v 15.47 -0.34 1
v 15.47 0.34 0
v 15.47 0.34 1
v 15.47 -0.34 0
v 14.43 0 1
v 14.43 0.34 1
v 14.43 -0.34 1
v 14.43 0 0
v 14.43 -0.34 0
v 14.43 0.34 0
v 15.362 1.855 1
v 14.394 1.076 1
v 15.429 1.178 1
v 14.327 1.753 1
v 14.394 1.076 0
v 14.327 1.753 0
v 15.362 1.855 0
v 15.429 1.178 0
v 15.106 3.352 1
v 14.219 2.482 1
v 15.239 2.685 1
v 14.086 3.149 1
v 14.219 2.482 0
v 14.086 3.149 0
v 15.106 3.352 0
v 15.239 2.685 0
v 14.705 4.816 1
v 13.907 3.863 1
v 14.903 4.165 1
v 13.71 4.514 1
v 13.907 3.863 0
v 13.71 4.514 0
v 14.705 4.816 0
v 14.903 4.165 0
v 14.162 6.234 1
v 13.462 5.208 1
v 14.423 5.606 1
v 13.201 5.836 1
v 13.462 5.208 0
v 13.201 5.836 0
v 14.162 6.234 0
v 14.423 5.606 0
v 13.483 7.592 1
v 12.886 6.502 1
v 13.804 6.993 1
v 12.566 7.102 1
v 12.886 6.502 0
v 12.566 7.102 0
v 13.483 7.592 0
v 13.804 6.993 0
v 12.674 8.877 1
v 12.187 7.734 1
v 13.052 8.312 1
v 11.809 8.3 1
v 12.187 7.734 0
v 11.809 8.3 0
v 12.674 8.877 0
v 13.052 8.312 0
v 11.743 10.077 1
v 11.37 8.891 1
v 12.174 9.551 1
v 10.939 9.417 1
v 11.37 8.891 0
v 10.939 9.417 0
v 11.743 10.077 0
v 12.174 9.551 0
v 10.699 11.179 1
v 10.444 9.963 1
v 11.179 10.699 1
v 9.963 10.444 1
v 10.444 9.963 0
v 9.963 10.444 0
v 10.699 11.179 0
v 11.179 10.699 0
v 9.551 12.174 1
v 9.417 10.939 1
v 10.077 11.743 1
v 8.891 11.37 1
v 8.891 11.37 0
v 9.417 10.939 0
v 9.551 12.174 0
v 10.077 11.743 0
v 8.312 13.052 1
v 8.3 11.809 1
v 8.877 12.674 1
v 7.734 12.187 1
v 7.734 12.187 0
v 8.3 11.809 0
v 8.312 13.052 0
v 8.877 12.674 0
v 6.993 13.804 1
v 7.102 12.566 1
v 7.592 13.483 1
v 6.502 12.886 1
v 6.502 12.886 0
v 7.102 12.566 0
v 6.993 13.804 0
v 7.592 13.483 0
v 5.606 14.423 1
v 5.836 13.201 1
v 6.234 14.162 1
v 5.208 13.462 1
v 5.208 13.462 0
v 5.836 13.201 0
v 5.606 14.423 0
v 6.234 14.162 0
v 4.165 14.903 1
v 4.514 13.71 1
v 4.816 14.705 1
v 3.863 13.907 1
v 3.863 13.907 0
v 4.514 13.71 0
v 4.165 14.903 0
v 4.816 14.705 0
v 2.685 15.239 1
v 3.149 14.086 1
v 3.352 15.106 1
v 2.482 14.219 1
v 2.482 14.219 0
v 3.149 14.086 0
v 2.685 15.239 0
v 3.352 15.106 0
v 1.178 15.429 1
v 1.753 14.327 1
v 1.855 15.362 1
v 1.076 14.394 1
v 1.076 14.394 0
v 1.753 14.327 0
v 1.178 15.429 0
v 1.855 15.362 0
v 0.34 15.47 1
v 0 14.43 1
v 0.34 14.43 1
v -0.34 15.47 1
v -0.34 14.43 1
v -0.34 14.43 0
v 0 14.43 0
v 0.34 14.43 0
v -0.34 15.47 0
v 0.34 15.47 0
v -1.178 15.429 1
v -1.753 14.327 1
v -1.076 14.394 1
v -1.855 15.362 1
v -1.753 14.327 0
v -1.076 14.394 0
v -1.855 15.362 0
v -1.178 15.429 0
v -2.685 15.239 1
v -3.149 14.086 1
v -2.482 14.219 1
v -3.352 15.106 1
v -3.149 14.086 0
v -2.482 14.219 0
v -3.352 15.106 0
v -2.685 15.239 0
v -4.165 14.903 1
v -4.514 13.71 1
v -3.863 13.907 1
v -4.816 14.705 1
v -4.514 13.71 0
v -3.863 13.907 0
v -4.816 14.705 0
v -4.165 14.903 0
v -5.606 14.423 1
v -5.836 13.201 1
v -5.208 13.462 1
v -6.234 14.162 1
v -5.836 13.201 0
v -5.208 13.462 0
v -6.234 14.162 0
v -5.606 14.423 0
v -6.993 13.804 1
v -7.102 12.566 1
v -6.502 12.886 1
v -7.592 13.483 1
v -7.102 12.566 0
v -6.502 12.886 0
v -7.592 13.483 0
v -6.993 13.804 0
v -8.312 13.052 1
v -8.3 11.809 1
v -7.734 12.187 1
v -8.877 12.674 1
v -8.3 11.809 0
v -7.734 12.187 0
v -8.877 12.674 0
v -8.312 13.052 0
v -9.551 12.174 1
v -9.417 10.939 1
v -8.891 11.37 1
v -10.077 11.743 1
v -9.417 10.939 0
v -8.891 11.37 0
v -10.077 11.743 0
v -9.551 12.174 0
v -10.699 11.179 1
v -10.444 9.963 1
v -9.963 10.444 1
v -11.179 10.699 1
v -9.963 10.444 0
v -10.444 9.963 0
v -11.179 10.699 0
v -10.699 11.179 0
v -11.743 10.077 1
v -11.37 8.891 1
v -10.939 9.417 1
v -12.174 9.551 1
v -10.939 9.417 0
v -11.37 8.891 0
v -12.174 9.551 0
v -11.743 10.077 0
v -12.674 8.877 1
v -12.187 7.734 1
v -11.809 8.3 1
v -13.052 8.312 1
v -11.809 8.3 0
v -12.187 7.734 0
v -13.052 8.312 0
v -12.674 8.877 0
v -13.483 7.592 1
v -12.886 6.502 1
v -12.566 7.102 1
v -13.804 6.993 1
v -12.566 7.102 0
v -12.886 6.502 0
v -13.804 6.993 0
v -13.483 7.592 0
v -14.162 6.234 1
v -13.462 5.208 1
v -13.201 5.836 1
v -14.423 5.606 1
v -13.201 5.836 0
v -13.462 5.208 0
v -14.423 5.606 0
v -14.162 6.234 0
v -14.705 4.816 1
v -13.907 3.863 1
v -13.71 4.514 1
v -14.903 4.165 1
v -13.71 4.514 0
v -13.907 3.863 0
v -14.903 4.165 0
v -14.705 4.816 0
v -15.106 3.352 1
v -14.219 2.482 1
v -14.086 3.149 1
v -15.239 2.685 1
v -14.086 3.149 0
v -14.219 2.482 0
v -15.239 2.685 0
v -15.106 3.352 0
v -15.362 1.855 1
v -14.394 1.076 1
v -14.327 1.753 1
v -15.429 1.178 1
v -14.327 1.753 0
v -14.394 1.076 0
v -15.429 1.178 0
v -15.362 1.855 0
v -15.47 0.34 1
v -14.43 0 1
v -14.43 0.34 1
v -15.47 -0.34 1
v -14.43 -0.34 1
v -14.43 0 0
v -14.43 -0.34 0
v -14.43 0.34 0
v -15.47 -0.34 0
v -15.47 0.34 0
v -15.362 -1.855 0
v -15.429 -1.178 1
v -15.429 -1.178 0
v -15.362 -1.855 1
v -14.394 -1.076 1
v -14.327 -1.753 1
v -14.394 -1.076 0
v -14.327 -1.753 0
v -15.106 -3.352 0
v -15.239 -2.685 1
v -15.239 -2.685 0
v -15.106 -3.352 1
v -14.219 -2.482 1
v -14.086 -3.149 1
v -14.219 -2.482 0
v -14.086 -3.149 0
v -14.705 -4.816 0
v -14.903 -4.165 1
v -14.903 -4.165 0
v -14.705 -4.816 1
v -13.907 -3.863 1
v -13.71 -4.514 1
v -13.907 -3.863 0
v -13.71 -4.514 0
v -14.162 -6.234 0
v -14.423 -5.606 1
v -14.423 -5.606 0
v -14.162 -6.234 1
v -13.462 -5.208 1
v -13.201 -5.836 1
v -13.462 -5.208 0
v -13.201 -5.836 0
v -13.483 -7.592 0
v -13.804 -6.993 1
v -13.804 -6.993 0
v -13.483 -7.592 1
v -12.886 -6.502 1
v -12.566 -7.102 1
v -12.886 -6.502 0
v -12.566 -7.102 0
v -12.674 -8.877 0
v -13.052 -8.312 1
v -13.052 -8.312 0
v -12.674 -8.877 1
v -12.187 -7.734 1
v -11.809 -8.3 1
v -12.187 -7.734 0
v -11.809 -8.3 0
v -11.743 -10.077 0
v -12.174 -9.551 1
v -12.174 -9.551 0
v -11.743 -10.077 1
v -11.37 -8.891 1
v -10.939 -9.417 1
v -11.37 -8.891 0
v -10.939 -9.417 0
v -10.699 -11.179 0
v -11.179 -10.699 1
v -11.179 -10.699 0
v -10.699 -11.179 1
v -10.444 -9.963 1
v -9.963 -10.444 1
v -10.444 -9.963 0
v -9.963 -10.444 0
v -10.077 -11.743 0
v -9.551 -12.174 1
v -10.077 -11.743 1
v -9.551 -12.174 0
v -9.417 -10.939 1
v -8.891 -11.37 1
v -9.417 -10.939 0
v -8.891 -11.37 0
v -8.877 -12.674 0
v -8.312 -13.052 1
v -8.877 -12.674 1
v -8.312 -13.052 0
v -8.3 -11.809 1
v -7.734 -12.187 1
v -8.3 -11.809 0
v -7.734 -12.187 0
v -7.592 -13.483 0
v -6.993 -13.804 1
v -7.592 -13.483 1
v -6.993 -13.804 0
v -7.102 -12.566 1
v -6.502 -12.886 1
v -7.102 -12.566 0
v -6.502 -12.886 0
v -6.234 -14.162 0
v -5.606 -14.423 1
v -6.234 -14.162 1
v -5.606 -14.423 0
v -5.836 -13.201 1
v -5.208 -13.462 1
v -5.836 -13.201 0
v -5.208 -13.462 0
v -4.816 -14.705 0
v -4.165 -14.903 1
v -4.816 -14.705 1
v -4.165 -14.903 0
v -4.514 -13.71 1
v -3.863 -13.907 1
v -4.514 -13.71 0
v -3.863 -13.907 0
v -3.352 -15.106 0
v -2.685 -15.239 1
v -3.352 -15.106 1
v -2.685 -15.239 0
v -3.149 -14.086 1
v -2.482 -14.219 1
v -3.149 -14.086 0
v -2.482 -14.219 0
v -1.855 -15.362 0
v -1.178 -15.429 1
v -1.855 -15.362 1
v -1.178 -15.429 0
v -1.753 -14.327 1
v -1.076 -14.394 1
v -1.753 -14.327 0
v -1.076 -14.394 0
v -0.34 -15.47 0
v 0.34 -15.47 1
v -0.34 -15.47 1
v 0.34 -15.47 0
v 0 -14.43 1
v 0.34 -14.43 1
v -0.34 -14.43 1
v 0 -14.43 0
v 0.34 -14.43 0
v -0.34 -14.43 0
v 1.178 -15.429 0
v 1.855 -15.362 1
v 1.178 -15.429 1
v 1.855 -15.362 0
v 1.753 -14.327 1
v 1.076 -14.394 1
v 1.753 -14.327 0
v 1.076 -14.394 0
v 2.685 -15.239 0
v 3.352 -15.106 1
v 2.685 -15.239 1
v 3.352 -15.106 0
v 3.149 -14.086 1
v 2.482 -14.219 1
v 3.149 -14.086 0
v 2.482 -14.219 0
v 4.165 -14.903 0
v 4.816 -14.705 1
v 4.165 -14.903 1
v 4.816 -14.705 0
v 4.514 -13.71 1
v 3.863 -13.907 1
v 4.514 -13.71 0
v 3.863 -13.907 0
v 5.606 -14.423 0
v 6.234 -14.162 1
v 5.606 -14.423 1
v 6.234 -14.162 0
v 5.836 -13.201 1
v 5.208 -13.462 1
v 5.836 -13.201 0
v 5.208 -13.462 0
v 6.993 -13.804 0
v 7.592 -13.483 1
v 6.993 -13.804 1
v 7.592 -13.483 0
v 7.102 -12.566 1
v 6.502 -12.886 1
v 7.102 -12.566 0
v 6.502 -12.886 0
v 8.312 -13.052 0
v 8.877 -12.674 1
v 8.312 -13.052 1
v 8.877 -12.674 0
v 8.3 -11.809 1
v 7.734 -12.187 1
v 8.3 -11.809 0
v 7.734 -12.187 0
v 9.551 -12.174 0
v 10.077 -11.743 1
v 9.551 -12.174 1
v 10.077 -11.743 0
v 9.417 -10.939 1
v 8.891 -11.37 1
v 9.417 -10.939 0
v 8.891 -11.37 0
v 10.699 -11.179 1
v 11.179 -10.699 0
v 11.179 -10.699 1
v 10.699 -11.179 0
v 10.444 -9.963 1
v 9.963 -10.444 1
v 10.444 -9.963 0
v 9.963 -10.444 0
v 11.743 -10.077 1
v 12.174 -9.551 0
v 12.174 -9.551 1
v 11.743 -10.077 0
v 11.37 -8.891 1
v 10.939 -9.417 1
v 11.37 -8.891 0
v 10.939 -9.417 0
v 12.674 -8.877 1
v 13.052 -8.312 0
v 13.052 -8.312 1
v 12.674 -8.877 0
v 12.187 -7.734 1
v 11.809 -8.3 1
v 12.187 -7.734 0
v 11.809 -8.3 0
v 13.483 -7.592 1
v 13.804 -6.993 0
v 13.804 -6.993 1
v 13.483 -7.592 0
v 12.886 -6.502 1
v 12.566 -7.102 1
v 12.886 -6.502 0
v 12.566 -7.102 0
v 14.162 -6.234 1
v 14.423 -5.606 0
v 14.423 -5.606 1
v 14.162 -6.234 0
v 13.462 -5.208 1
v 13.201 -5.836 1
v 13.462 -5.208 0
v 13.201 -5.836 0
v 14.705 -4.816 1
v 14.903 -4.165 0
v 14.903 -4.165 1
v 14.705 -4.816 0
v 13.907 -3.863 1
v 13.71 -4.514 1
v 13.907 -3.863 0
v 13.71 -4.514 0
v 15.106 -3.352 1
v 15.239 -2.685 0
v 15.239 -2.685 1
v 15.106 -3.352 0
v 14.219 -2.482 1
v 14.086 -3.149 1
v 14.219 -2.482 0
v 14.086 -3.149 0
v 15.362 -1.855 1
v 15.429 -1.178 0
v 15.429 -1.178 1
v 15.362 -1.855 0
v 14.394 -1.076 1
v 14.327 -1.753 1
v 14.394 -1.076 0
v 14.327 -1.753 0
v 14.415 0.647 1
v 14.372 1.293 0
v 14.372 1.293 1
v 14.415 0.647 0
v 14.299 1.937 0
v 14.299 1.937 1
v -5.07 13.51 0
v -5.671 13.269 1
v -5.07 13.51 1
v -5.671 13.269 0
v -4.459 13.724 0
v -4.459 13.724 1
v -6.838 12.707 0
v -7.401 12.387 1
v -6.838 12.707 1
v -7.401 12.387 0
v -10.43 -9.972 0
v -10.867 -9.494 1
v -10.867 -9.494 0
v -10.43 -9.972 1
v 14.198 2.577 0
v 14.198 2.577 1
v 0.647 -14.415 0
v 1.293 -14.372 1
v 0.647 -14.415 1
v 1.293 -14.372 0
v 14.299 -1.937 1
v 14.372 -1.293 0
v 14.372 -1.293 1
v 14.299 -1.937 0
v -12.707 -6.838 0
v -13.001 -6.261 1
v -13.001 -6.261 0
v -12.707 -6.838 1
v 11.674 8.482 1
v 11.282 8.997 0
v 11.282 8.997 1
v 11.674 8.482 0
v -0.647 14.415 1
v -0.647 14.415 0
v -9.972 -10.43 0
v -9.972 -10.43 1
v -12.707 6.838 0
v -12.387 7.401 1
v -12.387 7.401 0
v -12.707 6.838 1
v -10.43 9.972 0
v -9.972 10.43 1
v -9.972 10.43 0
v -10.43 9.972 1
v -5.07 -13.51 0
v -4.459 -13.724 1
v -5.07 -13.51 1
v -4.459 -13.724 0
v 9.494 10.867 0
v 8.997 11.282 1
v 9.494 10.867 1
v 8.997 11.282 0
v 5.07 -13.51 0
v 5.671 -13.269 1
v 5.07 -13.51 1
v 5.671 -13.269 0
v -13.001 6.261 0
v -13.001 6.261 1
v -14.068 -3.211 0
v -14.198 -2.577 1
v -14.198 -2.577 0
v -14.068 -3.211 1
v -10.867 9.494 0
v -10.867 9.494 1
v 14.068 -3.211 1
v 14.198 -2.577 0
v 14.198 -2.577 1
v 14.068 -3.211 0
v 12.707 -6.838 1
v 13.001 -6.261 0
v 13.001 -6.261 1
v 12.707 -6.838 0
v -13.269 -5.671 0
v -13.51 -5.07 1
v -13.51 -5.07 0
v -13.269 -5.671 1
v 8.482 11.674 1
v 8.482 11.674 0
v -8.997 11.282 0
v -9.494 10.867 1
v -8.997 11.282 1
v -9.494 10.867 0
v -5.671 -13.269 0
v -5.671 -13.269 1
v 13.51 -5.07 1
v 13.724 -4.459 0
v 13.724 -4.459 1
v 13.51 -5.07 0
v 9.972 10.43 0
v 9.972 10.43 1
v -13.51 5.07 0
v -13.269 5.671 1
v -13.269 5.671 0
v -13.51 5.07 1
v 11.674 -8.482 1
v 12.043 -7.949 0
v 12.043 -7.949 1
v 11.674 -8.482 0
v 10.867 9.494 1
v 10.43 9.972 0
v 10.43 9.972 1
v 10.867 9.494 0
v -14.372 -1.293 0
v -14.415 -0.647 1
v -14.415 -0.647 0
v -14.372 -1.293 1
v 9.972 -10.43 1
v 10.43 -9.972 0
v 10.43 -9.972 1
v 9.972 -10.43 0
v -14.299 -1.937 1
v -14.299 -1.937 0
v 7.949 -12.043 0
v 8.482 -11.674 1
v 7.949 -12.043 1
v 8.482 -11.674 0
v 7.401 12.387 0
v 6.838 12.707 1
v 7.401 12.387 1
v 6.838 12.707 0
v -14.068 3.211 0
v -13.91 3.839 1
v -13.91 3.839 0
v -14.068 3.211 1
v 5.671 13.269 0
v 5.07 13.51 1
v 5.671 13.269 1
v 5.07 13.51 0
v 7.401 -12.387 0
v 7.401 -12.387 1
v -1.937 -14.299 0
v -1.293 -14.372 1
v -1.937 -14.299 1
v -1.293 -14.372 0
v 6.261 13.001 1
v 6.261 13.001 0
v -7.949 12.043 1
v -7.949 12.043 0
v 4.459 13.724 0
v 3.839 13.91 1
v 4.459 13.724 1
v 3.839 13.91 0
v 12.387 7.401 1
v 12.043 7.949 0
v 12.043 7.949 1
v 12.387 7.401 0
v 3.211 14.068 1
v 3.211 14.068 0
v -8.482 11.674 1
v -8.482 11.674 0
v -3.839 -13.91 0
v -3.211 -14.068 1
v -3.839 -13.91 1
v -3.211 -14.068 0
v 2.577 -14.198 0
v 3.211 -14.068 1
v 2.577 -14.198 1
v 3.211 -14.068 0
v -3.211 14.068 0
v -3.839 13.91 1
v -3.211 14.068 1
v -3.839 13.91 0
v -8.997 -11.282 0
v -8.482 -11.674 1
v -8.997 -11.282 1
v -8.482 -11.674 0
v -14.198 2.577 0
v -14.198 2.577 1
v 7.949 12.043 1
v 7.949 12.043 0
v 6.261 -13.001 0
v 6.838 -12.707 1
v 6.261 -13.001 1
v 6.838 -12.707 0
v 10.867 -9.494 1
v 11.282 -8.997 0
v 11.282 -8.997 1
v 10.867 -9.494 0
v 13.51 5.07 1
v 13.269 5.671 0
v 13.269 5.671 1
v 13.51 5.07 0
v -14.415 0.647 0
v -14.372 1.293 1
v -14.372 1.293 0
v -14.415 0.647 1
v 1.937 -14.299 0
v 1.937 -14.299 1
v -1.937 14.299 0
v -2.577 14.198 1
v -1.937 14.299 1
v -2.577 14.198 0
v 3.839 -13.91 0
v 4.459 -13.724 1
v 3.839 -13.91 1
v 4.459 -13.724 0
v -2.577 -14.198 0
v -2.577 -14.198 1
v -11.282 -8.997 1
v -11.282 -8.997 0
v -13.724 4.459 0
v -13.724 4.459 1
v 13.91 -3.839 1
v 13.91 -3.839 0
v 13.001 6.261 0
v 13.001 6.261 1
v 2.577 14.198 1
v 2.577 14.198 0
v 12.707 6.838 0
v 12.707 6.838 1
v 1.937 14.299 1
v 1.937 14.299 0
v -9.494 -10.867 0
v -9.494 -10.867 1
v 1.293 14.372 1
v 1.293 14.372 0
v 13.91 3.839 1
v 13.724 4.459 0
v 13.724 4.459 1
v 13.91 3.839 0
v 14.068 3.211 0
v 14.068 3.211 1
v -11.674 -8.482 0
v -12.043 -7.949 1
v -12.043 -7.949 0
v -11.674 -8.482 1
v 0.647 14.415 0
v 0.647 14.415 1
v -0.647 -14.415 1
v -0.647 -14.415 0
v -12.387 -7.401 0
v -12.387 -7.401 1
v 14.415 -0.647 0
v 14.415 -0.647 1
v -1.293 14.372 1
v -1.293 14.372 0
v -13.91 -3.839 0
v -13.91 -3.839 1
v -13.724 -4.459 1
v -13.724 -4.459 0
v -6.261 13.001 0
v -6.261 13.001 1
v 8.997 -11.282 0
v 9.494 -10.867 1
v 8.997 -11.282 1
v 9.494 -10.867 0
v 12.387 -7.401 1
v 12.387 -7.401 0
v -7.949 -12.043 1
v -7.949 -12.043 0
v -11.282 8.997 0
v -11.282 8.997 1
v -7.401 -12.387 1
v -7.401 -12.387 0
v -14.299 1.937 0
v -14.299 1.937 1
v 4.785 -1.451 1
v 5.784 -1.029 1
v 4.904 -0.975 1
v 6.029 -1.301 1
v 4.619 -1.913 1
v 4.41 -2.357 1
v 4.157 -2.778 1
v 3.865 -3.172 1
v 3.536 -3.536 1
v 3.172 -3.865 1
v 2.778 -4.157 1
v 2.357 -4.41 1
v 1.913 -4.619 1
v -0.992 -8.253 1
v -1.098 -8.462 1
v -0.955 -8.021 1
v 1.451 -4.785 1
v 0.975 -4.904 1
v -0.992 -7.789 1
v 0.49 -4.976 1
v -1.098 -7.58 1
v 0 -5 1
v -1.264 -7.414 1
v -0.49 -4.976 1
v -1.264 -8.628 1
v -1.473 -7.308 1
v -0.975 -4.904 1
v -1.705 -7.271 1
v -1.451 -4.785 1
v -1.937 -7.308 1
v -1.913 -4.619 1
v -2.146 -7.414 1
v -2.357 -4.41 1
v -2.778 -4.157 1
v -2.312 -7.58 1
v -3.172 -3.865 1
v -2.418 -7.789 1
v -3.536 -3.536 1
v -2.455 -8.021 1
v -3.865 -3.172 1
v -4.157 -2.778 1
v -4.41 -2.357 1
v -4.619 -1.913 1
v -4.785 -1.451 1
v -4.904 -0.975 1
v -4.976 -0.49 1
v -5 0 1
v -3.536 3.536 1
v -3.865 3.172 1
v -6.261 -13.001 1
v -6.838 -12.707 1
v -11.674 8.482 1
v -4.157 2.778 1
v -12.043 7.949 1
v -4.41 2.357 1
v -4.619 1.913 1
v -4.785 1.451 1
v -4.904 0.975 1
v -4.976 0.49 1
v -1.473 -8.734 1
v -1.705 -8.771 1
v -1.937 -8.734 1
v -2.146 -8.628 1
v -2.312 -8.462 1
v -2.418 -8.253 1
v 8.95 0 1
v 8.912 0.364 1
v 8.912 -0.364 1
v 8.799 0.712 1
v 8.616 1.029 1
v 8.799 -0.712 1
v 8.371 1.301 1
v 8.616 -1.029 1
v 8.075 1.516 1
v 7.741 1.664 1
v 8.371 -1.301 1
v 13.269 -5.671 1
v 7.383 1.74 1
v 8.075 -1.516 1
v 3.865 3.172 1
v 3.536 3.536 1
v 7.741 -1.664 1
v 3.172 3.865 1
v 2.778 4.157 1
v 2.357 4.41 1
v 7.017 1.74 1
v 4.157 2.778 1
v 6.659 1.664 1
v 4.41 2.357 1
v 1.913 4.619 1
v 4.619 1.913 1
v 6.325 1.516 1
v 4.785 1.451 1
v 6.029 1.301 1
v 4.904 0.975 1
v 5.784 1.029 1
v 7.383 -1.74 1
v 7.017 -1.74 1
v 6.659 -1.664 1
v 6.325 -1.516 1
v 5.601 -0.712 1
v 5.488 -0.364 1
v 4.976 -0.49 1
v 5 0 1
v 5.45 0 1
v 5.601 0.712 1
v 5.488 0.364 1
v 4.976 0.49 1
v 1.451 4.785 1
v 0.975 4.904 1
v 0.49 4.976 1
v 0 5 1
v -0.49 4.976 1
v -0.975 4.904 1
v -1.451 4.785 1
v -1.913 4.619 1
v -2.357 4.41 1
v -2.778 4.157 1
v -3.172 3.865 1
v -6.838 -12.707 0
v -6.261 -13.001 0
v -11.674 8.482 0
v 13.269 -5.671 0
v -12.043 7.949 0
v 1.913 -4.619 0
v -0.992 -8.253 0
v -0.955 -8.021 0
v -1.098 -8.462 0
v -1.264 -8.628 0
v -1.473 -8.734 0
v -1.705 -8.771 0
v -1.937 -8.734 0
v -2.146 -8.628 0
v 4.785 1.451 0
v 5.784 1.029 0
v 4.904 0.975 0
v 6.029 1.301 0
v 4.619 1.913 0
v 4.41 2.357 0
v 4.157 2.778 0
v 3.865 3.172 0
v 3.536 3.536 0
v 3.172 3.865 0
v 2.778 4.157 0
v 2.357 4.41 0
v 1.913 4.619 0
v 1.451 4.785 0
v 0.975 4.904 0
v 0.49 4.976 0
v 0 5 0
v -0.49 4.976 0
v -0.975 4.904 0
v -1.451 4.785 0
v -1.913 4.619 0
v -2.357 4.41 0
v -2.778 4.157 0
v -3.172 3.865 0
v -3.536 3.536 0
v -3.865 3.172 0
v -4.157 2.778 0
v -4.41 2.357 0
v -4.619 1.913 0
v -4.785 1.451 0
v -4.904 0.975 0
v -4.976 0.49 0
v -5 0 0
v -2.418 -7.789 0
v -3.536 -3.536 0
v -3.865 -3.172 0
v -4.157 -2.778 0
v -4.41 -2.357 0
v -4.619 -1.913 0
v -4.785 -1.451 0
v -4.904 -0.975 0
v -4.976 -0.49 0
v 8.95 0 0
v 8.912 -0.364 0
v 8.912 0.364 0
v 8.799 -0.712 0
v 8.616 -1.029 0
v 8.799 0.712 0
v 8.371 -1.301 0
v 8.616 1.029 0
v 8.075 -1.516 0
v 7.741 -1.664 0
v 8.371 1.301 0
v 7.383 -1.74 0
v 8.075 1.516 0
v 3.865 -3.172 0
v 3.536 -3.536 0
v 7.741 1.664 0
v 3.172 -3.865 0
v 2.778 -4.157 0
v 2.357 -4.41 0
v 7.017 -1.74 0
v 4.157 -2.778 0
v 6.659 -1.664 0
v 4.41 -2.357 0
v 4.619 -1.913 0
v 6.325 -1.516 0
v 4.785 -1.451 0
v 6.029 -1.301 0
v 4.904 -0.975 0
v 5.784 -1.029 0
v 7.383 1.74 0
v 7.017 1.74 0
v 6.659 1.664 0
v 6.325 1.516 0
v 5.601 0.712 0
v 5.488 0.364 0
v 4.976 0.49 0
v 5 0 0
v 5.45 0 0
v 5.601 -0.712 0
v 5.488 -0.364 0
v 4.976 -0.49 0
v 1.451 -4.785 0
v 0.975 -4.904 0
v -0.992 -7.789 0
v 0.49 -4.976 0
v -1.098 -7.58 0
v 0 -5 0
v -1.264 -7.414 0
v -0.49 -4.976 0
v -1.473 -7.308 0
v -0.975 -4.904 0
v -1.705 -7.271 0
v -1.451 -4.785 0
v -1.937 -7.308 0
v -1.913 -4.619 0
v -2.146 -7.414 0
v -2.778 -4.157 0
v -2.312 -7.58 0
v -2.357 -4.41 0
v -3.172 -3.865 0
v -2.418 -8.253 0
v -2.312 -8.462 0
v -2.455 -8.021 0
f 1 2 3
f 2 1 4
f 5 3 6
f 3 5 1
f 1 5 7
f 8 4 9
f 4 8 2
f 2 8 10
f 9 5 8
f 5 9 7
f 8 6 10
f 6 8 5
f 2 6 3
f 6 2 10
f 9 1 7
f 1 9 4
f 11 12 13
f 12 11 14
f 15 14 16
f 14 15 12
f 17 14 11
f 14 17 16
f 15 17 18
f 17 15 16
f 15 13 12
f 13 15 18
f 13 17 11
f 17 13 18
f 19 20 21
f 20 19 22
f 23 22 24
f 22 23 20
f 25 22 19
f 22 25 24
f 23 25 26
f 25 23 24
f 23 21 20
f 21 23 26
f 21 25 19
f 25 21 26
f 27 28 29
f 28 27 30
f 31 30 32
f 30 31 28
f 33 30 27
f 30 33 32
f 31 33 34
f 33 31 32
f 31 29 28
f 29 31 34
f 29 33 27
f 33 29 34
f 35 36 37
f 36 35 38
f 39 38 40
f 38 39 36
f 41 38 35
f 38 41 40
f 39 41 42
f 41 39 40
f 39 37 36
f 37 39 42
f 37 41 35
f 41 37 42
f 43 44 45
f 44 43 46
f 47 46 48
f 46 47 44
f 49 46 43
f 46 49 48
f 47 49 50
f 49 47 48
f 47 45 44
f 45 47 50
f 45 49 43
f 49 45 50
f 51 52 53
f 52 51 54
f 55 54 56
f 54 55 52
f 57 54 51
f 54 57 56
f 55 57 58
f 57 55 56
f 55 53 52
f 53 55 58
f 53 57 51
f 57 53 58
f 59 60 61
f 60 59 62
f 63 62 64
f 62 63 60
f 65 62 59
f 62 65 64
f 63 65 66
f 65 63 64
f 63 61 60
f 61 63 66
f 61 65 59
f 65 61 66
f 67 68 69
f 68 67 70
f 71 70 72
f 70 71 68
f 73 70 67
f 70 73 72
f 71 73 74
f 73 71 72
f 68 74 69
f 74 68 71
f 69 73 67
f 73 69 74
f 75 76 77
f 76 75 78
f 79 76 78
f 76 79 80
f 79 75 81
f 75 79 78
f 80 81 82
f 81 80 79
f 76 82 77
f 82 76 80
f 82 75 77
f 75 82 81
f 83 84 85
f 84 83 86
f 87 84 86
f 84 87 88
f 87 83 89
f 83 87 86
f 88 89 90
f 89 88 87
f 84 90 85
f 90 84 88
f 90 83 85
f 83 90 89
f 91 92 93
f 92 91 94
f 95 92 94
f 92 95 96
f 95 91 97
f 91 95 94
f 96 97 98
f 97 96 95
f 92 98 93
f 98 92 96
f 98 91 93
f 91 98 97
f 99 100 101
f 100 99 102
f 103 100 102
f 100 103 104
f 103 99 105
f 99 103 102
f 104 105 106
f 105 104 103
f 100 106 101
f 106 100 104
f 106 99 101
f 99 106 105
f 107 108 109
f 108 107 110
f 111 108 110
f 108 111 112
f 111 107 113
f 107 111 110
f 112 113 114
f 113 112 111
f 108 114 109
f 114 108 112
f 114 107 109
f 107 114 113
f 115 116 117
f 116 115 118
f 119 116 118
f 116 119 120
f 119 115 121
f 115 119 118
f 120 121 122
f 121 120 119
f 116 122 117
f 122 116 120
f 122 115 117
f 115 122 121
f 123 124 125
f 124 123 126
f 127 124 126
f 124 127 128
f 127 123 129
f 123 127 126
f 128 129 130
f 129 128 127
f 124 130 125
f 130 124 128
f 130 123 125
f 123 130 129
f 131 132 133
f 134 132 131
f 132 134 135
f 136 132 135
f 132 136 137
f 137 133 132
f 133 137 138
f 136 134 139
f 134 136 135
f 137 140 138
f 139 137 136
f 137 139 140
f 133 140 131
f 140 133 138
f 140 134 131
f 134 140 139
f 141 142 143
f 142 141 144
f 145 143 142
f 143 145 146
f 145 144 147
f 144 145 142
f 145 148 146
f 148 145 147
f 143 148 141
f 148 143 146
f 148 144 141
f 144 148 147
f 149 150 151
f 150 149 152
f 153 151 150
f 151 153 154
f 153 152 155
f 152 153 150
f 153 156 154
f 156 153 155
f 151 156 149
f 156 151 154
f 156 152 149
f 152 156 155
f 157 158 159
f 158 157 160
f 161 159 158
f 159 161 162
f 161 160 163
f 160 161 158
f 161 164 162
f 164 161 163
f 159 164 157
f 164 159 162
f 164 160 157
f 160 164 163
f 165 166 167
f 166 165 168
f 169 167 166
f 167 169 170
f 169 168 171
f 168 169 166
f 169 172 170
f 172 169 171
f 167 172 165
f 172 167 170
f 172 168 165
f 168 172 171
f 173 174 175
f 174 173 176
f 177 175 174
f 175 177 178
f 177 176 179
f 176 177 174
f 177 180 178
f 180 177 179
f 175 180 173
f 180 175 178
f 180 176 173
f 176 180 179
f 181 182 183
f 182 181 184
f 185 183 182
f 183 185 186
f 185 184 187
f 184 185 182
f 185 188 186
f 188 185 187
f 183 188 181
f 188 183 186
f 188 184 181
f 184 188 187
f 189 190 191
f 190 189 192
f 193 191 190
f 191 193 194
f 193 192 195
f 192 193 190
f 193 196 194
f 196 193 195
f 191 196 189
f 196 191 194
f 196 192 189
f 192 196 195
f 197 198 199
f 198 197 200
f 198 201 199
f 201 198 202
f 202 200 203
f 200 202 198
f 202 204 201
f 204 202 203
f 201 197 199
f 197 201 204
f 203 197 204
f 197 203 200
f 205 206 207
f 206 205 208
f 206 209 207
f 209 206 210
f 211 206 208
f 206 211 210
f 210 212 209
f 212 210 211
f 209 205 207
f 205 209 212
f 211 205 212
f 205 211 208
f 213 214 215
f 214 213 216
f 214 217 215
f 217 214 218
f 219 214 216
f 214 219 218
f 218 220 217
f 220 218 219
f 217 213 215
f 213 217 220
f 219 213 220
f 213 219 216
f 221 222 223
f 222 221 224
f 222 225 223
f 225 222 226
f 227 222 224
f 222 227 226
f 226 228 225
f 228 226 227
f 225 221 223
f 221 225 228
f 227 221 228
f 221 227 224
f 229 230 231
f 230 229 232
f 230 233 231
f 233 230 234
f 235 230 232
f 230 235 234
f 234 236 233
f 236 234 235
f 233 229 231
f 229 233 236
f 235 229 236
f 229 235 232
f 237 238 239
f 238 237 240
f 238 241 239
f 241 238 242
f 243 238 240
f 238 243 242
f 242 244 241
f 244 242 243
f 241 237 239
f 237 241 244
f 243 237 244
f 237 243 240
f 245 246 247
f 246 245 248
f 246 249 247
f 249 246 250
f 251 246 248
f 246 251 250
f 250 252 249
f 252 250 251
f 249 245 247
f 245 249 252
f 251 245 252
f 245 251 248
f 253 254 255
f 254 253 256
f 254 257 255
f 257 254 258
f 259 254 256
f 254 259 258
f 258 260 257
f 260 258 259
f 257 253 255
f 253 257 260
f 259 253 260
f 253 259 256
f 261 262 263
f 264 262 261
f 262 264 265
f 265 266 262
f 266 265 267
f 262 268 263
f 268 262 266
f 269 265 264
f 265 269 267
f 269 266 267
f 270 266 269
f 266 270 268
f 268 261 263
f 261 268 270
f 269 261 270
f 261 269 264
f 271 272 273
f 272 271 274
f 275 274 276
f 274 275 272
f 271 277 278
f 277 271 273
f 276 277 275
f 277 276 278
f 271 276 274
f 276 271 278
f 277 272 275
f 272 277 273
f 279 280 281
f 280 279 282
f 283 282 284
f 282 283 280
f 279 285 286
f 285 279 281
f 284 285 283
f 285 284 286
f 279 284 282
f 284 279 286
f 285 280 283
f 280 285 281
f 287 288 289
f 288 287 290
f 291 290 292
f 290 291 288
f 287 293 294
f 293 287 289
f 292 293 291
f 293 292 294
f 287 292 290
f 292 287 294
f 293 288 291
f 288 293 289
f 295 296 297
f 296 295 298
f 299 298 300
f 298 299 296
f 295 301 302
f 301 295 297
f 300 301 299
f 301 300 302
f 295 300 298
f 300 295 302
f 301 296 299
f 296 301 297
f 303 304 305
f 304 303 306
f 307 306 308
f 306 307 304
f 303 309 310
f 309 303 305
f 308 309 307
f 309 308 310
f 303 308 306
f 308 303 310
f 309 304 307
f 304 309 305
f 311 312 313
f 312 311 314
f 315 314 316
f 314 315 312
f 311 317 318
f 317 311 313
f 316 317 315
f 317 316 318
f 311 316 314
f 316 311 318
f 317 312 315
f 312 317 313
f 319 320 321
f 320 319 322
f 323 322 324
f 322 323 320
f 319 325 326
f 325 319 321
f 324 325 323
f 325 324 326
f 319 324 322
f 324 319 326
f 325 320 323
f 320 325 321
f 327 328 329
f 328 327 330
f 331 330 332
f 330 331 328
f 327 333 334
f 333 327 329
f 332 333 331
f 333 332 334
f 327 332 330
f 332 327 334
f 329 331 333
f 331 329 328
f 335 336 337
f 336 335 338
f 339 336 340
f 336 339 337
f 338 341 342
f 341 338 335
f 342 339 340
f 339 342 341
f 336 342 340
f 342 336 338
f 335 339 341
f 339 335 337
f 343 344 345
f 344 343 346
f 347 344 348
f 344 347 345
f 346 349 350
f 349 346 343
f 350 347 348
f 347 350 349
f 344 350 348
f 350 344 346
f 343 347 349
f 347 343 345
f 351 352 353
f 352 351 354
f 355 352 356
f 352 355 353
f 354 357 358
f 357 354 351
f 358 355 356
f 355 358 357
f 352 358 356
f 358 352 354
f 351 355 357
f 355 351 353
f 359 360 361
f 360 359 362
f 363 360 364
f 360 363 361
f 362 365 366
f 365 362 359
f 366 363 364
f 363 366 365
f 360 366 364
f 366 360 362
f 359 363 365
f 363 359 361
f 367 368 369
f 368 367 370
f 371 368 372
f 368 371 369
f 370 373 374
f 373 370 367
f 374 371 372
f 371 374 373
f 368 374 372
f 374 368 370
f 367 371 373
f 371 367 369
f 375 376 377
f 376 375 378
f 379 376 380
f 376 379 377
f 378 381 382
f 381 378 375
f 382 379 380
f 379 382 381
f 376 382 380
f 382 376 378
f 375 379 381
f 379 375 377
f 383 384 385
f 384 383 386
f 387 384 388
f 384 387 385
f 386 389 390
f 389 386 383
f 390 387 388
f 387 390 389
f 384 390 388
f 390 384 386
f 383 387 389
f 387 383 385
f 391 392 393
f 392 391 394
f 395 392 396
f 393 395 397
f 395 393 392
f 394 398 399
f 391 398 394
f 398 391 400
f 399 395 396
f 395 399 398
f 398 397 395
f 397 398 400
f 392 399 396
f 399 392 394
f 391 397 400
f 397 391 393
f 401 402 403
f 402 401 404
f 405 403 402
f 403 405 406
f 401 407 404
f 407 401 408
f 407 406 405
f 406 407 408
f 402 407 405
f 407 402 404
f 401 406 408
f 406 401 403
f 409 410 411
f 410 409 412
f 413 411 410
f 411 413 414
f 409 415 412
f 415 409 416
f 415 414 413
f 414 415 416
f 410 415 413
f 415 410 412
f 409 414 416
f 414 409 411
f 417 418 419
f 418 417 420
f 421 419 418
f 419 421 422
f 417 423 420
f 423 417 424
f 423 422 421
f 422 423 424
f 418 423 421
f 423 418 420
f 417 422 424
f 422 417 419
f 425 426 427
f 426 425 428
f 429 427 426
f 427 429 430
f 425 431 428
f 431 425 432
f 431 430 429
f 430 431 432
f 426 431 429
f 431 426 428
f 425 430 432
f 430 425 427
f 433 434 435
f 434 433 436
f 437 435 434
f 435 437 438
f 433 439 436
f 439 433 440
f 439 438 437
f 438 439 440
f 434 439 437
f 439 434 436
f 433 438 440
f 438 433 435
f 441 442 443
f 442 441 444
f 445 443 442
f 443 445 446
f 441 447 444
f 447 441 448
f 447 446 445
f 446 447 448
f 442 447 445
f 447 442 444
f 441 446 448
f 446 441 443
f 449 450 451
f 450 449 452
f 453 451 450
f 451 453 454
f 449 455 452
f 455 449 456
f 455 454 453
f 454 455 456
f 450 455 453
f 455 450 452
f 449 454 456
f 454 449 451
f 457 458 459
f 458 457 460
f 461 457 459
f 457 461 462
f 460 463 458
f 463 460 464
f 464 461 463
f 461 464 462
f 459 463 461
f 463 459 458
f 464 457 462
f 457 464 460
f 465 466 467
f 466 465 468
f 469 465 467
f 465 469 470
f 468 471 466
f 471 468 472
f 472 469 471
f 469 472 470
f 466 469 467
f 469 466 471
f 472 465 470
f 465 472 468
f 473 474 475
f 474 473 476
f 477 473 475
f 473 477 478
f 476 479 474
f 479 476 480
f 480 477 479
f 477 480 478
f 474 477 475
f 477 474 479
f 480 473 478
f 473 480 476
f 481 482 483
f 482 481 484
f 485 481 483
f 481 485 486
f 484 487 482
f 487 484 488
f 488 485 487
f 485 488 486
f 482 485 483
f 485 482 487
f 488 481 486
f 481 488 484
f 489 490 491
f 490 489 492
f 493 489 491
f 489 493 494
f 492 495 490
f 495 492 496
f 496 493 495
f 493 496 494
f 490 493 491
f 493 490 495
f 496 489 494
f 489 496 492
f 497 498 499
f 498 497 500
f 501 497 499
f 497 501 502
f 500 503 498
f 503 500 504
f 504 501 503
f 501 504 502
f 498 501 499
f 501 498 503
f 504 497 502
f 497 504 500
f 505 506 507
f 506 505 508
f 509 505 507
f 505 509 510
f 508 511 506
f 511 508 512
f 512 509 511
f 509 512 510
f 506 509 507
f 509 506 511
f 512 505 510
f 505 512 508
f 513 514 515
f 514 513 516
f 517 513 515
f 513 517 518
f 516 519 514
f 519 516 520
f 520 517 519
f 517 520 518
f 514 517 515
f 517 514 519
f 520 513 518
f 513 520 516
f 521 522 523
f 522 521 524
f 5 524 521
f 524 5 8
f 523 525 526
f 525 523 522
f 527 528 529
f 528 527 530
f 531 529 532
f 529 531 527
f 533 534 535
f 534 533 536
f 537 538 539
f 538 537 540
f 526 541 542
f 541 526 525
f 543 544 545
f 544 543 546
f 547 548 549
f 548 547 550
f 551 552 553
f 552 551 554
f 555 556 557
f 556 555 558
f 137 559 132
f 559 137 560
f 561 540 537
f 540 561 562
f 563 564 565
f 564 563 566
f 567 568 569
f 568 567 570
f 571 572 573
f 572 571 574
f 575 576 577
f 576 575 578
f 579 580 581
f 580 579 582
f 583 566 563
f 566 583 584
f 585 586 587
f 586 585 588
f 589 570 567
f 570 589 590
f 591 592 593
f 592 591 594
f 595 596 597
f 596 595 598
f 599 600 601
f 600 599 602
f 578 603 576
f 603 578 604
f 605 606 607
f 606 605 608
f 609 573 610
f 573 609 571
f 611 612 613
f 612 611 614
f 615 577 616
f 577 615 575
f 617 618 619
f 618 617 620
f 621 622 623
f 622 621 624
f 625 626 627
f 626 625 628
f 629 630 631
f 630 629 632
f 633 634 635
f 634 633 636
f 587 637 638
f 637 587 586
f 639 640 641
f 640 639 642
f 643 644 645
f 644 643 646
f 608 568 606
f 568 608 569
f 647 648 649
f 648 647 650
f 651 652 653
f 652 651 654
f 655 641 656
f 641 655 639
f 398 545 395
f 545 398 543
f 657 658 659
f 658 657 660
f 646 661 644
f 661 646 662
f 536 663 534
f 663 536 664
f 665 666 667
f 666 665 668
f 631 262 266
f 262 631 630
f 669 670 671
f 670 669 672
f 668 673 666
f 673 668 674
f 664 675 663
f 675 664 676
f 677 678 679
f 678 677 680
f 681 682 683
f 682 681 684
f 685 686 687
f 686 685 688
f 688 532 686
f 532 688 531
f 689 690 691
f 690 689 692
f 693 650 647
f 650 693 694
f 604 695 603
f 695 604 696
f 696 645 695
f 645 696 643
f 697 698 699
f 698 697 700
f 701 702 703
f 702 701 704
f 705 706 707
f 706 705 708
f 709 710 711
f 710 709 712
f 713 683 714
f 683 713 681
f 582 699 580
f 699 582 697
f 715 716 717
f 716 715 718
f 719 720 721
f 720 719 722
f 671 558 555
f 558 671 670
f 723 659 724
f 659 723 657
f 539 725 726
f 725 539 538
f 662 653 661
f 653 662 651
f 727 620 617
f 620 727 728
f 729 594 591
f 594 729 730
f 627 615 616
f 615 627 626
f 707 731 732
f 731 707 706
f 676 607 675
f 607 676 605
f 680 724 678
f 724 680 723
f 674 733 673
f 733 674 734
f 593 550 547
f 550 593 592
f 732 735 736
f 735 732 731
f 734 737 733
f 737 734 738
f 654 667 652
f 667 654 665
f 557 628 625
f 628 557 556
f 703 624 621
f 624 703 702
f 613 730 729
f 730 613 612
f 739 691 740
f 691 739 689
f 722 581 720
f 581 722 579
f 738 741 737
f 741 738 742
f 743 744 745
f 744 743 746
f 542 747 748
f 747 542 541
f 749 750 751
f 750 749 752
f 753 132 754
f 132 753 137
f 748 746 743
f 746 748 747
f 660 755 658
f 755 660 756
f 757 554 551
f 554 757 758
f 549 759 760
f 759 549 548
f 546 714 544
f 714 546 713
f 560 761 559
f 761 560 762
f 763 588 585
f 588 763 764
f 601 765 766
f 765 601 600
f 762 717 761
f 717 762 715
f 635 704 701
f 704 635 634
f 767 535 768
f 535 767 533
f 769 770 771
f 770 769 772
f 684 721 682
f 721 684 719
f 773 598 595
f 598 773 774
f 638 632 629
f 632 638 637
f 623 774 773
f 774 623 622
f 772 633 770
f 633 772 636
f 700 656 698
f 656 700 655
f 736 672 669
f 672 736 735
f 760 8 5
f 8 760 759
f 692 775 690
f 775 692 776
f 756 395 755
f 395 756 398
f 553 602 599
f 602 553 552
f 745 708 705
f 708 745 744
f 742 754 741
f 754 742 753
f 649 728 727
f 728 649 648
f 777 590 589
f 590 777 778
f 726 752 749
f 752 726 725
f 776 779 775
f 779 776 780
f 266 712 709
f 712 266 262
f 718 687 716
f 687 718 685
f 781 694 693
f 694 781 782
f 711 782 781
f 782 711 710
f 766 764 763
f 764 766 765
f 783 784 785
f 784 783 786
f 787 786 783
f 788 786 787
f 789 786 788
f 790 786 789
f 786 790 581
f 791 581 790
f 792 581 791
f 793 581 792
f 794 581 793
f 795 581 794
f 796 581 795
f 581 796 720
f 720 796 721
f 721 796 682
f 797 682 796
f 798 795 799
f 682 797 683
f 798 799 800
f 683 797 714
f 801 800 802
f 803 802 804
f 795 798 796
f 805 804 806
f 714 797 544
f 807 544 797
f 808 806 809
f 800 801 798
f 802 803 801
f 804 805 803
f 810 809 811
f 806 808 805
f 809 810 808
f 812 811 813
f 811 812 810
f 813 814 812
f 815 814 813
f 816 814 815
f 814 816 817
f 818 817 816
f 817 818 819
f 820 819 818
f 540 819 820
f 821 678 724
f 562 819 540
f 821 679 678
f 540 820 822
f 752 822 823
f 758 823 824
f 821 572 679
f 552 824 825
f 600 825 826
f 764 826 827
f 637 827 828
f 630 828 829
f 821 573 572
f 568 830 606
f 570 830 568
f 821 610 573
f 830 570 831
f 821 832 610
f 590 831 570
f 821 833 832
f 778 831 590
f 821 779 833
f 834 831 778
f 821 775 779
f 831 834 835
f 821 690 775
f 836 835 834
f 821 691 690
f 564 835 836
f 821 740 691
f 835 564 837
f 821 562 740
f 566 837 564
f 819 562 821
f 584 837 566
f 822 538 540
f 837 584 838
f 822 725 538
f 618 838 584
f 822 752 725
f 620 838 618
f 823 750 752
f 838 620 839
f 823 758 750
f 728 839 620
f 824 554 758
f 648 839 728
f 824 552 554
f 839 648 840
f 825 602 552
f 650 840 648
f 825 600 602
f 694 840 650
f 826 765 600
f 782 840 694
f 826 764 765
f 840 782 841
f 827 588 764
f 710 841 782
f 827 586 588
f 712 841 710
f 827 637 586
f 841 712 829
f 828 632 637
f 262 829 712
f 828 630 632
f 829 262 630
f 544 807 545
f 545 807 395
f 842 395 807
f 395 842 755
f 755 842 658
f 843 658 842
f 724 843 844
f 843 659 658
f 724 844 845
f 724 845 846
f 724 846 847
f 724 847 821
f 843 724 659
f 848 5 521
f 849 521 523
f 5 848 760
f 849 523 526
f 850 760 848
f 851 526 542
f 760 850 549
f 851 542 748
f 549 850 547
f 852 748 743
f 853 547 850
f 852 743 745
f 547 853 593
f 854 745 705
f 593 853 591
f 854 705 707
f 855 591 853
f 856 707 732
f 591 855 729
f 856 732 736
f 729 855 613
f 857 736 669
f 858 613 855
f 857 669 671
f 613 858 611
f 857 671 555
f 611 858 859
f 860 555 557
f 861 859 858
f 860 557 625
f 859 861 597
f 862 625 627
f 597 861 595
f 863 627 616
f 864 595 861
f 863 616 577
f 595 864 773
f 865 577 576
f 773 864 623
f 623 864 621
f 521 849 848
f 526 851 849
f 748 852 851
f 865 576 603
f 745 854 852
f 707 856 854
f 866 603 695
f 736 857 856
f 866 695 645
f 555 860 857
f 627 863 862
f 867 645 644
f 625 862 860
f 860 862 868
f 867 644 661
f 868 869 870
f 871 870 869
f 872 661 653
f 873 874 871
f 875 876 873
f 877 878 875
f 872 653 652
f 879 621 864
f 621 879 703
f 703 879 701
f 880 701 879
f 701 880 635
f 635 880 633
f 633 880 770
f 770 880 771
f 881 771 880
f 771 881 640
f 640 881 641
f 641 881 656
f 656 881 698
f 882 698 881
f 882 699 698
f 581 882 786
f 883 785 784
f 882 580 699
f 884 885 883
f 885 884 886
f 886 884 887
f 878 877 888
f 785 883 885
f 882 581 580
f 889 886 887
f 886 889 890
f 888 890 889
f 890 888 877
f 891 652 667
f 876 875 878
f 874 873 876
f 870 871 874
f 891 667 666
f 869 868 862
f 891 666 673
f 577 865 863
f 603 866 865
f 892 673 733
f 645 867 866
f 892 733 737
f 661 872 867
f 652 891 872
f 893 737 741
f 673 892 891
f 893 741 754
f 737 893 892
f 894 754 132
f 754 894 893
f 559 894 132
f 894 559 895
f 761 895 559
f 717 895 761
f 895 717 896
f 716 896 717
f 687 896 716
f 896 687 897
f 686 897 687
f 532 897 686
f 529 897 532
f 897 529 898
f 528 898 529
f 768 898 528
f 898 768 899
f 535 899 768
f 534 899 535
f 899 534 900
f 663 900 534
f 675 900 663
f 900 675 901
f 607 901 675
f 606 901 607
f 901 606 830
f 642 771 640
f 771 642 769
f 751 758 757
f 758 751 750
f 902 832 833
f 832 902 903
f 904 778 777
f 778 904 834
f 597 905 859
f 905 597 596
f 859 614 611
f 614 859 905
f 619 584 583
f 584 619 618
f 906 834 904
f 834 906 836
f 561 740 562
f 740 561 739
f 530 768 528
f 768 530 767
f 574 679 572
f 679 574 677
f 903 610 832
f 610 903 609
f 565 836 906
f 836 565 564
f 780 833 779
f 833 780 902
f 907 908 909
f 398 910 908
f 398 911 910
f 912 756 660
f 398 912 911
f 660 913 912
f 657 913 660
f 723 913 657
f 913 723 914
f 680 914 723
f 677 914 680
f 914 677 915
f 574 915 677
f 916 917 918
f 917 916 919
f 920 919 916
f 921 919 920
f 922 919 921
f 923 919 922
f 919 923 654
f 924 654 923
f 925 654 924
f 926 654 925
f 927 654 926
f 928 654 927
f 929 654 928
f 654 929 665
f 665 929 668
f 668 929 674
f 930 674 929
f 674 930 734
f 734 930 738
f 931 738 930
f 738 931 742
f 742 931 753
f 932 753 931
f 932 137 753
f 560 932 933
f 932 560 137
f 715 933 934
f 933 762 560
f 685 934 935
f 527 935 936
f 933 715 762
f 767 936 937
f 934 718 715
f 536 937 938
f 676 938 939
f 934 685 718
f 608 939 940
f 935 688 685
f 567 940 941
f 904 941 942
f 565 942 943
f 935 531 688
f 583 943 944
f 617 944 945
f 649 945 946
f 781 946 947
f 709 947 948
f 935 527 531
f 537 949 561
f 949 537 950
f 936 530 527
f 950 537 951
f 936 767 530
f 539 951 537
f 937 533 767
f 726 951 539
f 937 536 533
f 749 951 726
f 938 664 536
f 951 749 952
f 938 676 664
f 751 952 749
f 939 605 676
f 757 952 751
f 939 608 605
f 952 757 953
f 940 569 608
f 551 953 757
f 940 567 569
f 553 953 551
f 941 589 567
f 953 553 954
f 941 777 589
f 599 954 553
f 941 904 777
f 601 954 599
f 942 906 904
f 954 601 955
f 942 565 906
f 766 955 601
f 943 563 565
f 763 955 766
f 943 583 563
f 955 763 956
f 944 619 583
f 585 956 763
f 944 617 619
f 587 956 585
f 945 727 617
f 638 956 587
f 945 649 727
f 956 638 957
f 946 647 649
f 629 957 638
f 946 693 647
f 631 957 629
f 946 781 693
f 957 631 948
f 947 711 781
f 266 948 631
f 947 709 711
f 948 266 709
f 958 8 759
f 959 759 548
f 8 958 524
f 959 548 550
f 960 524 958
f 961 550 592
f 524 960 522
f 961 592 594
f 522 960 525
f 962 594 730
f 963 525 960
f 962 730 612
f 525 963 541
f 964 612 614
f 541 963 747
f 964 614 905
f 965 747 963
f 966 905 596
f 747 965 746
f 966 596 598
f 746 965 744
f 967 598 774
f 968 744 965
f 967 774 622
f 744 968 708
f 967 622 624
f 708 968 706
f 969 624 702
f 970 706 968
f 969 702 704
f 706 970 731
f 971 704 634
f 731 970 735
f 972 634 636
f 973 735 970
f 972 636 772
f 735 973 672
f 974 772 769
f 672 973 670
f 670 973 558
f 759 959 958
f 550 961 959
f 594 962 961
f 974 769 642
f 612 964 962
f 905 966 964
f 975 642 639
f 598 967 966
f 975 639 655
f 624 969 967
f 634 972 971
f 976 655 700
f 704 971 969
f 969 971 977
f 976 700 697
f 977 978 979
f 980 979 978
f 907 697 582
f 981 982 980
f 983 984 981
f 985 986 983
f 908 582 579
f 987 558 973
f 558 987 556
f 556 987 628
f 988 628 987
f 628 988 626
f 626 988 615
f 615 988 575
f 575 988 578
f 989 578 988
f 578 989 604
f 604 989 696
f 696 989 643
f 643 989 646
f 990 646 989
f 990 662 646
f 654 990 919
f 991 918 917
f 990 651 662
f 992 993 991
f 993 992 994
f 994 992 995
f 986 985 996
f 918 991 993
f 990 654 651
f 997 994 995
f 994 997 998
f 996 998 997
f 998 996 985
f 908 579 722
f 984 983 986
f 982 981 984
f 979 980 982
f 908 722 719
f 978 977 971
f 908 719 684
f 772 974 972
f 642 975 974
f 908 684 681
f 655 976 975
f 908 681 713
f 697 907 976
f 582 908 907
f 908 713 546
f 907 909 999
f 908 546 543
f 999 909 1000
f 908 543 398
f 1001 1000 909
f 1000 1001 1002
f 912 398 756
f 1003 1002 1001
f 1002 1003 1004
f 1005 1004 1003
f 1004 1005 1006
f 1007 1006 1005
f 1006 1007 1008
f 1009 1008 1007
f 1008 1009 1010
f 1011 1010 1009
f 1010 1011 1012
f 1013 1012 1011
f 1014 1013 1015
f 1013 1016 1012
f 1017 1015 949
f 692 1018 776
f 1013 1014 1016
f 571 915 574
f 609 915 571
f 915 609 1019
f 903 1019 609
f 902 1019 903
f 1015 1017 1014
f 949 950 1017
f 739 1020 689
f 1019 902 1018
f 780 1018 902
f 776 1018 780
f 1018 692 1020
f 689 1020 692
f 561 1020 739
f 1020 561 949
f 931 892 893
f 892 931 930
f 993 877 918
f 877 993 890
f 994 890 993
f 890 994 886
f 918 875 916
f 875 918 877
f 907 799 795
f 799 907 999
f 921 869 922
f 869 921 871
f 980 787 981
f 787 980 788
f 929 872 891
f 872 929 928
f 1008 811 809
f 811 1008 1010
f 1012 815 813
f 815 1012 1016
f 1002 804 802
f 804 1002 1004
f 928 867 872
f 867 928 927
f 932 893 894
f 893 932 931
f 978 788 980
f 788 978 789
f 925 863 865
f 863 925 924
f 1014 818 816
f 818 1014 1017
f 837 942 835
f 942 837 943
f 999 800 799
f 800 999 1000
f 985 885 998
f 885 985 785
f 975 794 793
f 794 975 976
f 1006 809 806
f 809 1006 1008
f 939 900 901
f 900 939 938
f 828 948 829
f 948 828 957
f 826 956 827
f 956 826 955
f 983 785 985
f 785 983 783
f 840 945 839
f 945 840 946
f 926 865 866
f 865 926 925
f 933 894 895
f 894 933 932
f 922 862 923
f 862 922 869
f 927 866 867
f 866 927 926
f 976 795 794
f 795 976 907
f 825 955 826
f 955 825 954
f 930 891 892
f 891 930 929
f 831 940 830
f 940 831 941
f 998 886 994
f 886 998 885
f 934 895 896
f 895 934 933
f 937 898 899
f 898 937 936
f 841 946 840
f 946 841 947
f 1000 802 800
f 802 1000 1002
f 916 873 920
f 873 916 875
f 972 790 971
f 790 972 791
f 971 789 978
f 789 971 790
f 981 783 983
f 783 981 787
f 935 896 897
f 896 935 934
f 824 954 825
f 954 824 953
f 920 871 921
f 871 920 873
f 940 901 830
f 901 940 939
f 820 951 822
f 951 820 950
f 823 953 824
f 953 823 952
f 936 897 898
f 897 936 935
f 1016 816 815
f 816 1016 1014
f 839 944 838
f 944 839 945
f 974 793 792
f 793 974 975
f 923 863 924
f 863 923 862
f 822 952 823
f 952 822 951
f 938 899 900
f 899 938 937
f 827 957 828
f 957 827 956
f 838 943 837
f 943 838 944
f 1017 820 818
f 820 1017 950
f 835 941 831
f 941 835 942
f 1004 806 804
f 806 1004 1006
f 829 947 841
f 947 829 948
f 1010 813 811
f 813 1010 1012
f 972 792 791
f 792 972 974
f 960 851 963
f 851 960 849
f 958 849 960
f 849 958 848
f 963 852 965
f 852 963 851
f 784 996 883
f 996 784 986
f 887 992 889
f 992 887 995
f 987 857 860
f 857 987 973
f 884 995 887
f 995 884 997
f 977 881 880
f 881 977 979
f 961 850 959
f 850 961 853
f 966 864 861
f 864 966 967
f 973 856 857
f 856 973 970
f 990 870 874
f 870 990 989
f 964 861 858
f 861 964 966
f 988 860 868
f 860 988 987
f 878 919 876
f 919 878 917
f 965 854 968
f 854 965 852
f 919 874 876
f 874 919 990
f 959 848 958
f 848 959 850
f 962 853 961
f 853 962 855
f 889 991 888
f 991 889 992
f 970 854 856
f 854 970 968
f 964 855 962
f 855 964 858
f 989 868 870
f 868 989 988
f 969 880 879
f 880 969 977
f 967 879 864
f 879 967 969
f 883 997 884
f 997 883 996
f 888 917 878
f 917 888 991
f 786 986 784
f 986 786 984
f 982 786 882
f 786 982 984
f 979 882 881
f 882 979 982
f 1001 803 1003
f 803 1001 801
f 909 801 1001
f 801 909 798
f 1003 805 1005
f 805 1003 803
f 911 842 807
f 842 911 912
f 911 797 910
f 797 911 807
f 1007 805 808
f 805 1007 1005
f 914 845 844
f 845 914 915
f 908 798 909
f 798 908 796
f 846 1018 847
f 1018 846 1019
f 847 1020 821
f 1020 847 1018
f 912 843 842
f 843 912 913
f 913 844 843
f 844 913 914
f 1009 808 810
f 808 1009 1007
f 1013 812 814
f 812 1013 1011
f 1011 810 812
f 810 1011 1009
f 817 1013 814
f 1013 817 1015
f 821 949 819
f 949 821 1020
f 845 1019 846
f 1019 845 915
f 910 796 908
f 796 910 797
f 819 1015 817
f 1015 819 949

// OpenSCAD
// part_id: jup4
// name: Jupiter gear
// source_drawing_ids: DRW-012
// units: mm
// revision: 0.1
// SPDX-License-Identifier: MIT

module jup4_tooth_ring(root_d = 28.86, tip_d = 30.94, tooth_count = 64, thickness = 1.0, tooth_w = 0.68) {
    union() {
        cylinder(d = root_d, h = thickness, center = false, $fn = 140);
        for (a = [0 : 360 / tooth_count : 360 - 360 / tooth_count]) {
            rotate([0, 0, a])
                translate([root_d / 2, -tooth_w / 2, 0])
                    cube([(tip_d - root_d) / 2, tooth_w, thickness], center = false);
        }
    }
}

module part_jup4(
    root_d = 28.86,
    tip_d = 30.94,
    tooth_count = 64,
    thickness = 1.0,
    bore_d = 10.0,
    aux_hole_d = 3.5,
    rivet_hole_d = 1.5,
    aux_hole_r = 7.2,
    rivet_hole_r = 8.2
) {
    difference() {
        jup4_tooth_ring(root_d = root_d, tip_d = tip_d, tooth_count = tooth_count, thickness = thickness);
        translate([0, 0, -0.05]) cylinder(d = bore_d, h = thickness + 0.1, $fn = 64);
        translate([aux_hole_r, 0, -0.05]) cylinder(d = aux_hole_d, h = thickness + 0.1, $fn = 30);
        translate([rivet_hole_r * cos(-102), rivet_hole_r * sin(-102), -0.05])
            cylinder(d = rivet_hole_d, h = thickness + 0.1, $fn = 20);
    }
}

// ---- "main guard" ----
// Default to previewing when opened directly:
if (is_undef(__LIB_MODE__)) {
    part_jup4();
}
